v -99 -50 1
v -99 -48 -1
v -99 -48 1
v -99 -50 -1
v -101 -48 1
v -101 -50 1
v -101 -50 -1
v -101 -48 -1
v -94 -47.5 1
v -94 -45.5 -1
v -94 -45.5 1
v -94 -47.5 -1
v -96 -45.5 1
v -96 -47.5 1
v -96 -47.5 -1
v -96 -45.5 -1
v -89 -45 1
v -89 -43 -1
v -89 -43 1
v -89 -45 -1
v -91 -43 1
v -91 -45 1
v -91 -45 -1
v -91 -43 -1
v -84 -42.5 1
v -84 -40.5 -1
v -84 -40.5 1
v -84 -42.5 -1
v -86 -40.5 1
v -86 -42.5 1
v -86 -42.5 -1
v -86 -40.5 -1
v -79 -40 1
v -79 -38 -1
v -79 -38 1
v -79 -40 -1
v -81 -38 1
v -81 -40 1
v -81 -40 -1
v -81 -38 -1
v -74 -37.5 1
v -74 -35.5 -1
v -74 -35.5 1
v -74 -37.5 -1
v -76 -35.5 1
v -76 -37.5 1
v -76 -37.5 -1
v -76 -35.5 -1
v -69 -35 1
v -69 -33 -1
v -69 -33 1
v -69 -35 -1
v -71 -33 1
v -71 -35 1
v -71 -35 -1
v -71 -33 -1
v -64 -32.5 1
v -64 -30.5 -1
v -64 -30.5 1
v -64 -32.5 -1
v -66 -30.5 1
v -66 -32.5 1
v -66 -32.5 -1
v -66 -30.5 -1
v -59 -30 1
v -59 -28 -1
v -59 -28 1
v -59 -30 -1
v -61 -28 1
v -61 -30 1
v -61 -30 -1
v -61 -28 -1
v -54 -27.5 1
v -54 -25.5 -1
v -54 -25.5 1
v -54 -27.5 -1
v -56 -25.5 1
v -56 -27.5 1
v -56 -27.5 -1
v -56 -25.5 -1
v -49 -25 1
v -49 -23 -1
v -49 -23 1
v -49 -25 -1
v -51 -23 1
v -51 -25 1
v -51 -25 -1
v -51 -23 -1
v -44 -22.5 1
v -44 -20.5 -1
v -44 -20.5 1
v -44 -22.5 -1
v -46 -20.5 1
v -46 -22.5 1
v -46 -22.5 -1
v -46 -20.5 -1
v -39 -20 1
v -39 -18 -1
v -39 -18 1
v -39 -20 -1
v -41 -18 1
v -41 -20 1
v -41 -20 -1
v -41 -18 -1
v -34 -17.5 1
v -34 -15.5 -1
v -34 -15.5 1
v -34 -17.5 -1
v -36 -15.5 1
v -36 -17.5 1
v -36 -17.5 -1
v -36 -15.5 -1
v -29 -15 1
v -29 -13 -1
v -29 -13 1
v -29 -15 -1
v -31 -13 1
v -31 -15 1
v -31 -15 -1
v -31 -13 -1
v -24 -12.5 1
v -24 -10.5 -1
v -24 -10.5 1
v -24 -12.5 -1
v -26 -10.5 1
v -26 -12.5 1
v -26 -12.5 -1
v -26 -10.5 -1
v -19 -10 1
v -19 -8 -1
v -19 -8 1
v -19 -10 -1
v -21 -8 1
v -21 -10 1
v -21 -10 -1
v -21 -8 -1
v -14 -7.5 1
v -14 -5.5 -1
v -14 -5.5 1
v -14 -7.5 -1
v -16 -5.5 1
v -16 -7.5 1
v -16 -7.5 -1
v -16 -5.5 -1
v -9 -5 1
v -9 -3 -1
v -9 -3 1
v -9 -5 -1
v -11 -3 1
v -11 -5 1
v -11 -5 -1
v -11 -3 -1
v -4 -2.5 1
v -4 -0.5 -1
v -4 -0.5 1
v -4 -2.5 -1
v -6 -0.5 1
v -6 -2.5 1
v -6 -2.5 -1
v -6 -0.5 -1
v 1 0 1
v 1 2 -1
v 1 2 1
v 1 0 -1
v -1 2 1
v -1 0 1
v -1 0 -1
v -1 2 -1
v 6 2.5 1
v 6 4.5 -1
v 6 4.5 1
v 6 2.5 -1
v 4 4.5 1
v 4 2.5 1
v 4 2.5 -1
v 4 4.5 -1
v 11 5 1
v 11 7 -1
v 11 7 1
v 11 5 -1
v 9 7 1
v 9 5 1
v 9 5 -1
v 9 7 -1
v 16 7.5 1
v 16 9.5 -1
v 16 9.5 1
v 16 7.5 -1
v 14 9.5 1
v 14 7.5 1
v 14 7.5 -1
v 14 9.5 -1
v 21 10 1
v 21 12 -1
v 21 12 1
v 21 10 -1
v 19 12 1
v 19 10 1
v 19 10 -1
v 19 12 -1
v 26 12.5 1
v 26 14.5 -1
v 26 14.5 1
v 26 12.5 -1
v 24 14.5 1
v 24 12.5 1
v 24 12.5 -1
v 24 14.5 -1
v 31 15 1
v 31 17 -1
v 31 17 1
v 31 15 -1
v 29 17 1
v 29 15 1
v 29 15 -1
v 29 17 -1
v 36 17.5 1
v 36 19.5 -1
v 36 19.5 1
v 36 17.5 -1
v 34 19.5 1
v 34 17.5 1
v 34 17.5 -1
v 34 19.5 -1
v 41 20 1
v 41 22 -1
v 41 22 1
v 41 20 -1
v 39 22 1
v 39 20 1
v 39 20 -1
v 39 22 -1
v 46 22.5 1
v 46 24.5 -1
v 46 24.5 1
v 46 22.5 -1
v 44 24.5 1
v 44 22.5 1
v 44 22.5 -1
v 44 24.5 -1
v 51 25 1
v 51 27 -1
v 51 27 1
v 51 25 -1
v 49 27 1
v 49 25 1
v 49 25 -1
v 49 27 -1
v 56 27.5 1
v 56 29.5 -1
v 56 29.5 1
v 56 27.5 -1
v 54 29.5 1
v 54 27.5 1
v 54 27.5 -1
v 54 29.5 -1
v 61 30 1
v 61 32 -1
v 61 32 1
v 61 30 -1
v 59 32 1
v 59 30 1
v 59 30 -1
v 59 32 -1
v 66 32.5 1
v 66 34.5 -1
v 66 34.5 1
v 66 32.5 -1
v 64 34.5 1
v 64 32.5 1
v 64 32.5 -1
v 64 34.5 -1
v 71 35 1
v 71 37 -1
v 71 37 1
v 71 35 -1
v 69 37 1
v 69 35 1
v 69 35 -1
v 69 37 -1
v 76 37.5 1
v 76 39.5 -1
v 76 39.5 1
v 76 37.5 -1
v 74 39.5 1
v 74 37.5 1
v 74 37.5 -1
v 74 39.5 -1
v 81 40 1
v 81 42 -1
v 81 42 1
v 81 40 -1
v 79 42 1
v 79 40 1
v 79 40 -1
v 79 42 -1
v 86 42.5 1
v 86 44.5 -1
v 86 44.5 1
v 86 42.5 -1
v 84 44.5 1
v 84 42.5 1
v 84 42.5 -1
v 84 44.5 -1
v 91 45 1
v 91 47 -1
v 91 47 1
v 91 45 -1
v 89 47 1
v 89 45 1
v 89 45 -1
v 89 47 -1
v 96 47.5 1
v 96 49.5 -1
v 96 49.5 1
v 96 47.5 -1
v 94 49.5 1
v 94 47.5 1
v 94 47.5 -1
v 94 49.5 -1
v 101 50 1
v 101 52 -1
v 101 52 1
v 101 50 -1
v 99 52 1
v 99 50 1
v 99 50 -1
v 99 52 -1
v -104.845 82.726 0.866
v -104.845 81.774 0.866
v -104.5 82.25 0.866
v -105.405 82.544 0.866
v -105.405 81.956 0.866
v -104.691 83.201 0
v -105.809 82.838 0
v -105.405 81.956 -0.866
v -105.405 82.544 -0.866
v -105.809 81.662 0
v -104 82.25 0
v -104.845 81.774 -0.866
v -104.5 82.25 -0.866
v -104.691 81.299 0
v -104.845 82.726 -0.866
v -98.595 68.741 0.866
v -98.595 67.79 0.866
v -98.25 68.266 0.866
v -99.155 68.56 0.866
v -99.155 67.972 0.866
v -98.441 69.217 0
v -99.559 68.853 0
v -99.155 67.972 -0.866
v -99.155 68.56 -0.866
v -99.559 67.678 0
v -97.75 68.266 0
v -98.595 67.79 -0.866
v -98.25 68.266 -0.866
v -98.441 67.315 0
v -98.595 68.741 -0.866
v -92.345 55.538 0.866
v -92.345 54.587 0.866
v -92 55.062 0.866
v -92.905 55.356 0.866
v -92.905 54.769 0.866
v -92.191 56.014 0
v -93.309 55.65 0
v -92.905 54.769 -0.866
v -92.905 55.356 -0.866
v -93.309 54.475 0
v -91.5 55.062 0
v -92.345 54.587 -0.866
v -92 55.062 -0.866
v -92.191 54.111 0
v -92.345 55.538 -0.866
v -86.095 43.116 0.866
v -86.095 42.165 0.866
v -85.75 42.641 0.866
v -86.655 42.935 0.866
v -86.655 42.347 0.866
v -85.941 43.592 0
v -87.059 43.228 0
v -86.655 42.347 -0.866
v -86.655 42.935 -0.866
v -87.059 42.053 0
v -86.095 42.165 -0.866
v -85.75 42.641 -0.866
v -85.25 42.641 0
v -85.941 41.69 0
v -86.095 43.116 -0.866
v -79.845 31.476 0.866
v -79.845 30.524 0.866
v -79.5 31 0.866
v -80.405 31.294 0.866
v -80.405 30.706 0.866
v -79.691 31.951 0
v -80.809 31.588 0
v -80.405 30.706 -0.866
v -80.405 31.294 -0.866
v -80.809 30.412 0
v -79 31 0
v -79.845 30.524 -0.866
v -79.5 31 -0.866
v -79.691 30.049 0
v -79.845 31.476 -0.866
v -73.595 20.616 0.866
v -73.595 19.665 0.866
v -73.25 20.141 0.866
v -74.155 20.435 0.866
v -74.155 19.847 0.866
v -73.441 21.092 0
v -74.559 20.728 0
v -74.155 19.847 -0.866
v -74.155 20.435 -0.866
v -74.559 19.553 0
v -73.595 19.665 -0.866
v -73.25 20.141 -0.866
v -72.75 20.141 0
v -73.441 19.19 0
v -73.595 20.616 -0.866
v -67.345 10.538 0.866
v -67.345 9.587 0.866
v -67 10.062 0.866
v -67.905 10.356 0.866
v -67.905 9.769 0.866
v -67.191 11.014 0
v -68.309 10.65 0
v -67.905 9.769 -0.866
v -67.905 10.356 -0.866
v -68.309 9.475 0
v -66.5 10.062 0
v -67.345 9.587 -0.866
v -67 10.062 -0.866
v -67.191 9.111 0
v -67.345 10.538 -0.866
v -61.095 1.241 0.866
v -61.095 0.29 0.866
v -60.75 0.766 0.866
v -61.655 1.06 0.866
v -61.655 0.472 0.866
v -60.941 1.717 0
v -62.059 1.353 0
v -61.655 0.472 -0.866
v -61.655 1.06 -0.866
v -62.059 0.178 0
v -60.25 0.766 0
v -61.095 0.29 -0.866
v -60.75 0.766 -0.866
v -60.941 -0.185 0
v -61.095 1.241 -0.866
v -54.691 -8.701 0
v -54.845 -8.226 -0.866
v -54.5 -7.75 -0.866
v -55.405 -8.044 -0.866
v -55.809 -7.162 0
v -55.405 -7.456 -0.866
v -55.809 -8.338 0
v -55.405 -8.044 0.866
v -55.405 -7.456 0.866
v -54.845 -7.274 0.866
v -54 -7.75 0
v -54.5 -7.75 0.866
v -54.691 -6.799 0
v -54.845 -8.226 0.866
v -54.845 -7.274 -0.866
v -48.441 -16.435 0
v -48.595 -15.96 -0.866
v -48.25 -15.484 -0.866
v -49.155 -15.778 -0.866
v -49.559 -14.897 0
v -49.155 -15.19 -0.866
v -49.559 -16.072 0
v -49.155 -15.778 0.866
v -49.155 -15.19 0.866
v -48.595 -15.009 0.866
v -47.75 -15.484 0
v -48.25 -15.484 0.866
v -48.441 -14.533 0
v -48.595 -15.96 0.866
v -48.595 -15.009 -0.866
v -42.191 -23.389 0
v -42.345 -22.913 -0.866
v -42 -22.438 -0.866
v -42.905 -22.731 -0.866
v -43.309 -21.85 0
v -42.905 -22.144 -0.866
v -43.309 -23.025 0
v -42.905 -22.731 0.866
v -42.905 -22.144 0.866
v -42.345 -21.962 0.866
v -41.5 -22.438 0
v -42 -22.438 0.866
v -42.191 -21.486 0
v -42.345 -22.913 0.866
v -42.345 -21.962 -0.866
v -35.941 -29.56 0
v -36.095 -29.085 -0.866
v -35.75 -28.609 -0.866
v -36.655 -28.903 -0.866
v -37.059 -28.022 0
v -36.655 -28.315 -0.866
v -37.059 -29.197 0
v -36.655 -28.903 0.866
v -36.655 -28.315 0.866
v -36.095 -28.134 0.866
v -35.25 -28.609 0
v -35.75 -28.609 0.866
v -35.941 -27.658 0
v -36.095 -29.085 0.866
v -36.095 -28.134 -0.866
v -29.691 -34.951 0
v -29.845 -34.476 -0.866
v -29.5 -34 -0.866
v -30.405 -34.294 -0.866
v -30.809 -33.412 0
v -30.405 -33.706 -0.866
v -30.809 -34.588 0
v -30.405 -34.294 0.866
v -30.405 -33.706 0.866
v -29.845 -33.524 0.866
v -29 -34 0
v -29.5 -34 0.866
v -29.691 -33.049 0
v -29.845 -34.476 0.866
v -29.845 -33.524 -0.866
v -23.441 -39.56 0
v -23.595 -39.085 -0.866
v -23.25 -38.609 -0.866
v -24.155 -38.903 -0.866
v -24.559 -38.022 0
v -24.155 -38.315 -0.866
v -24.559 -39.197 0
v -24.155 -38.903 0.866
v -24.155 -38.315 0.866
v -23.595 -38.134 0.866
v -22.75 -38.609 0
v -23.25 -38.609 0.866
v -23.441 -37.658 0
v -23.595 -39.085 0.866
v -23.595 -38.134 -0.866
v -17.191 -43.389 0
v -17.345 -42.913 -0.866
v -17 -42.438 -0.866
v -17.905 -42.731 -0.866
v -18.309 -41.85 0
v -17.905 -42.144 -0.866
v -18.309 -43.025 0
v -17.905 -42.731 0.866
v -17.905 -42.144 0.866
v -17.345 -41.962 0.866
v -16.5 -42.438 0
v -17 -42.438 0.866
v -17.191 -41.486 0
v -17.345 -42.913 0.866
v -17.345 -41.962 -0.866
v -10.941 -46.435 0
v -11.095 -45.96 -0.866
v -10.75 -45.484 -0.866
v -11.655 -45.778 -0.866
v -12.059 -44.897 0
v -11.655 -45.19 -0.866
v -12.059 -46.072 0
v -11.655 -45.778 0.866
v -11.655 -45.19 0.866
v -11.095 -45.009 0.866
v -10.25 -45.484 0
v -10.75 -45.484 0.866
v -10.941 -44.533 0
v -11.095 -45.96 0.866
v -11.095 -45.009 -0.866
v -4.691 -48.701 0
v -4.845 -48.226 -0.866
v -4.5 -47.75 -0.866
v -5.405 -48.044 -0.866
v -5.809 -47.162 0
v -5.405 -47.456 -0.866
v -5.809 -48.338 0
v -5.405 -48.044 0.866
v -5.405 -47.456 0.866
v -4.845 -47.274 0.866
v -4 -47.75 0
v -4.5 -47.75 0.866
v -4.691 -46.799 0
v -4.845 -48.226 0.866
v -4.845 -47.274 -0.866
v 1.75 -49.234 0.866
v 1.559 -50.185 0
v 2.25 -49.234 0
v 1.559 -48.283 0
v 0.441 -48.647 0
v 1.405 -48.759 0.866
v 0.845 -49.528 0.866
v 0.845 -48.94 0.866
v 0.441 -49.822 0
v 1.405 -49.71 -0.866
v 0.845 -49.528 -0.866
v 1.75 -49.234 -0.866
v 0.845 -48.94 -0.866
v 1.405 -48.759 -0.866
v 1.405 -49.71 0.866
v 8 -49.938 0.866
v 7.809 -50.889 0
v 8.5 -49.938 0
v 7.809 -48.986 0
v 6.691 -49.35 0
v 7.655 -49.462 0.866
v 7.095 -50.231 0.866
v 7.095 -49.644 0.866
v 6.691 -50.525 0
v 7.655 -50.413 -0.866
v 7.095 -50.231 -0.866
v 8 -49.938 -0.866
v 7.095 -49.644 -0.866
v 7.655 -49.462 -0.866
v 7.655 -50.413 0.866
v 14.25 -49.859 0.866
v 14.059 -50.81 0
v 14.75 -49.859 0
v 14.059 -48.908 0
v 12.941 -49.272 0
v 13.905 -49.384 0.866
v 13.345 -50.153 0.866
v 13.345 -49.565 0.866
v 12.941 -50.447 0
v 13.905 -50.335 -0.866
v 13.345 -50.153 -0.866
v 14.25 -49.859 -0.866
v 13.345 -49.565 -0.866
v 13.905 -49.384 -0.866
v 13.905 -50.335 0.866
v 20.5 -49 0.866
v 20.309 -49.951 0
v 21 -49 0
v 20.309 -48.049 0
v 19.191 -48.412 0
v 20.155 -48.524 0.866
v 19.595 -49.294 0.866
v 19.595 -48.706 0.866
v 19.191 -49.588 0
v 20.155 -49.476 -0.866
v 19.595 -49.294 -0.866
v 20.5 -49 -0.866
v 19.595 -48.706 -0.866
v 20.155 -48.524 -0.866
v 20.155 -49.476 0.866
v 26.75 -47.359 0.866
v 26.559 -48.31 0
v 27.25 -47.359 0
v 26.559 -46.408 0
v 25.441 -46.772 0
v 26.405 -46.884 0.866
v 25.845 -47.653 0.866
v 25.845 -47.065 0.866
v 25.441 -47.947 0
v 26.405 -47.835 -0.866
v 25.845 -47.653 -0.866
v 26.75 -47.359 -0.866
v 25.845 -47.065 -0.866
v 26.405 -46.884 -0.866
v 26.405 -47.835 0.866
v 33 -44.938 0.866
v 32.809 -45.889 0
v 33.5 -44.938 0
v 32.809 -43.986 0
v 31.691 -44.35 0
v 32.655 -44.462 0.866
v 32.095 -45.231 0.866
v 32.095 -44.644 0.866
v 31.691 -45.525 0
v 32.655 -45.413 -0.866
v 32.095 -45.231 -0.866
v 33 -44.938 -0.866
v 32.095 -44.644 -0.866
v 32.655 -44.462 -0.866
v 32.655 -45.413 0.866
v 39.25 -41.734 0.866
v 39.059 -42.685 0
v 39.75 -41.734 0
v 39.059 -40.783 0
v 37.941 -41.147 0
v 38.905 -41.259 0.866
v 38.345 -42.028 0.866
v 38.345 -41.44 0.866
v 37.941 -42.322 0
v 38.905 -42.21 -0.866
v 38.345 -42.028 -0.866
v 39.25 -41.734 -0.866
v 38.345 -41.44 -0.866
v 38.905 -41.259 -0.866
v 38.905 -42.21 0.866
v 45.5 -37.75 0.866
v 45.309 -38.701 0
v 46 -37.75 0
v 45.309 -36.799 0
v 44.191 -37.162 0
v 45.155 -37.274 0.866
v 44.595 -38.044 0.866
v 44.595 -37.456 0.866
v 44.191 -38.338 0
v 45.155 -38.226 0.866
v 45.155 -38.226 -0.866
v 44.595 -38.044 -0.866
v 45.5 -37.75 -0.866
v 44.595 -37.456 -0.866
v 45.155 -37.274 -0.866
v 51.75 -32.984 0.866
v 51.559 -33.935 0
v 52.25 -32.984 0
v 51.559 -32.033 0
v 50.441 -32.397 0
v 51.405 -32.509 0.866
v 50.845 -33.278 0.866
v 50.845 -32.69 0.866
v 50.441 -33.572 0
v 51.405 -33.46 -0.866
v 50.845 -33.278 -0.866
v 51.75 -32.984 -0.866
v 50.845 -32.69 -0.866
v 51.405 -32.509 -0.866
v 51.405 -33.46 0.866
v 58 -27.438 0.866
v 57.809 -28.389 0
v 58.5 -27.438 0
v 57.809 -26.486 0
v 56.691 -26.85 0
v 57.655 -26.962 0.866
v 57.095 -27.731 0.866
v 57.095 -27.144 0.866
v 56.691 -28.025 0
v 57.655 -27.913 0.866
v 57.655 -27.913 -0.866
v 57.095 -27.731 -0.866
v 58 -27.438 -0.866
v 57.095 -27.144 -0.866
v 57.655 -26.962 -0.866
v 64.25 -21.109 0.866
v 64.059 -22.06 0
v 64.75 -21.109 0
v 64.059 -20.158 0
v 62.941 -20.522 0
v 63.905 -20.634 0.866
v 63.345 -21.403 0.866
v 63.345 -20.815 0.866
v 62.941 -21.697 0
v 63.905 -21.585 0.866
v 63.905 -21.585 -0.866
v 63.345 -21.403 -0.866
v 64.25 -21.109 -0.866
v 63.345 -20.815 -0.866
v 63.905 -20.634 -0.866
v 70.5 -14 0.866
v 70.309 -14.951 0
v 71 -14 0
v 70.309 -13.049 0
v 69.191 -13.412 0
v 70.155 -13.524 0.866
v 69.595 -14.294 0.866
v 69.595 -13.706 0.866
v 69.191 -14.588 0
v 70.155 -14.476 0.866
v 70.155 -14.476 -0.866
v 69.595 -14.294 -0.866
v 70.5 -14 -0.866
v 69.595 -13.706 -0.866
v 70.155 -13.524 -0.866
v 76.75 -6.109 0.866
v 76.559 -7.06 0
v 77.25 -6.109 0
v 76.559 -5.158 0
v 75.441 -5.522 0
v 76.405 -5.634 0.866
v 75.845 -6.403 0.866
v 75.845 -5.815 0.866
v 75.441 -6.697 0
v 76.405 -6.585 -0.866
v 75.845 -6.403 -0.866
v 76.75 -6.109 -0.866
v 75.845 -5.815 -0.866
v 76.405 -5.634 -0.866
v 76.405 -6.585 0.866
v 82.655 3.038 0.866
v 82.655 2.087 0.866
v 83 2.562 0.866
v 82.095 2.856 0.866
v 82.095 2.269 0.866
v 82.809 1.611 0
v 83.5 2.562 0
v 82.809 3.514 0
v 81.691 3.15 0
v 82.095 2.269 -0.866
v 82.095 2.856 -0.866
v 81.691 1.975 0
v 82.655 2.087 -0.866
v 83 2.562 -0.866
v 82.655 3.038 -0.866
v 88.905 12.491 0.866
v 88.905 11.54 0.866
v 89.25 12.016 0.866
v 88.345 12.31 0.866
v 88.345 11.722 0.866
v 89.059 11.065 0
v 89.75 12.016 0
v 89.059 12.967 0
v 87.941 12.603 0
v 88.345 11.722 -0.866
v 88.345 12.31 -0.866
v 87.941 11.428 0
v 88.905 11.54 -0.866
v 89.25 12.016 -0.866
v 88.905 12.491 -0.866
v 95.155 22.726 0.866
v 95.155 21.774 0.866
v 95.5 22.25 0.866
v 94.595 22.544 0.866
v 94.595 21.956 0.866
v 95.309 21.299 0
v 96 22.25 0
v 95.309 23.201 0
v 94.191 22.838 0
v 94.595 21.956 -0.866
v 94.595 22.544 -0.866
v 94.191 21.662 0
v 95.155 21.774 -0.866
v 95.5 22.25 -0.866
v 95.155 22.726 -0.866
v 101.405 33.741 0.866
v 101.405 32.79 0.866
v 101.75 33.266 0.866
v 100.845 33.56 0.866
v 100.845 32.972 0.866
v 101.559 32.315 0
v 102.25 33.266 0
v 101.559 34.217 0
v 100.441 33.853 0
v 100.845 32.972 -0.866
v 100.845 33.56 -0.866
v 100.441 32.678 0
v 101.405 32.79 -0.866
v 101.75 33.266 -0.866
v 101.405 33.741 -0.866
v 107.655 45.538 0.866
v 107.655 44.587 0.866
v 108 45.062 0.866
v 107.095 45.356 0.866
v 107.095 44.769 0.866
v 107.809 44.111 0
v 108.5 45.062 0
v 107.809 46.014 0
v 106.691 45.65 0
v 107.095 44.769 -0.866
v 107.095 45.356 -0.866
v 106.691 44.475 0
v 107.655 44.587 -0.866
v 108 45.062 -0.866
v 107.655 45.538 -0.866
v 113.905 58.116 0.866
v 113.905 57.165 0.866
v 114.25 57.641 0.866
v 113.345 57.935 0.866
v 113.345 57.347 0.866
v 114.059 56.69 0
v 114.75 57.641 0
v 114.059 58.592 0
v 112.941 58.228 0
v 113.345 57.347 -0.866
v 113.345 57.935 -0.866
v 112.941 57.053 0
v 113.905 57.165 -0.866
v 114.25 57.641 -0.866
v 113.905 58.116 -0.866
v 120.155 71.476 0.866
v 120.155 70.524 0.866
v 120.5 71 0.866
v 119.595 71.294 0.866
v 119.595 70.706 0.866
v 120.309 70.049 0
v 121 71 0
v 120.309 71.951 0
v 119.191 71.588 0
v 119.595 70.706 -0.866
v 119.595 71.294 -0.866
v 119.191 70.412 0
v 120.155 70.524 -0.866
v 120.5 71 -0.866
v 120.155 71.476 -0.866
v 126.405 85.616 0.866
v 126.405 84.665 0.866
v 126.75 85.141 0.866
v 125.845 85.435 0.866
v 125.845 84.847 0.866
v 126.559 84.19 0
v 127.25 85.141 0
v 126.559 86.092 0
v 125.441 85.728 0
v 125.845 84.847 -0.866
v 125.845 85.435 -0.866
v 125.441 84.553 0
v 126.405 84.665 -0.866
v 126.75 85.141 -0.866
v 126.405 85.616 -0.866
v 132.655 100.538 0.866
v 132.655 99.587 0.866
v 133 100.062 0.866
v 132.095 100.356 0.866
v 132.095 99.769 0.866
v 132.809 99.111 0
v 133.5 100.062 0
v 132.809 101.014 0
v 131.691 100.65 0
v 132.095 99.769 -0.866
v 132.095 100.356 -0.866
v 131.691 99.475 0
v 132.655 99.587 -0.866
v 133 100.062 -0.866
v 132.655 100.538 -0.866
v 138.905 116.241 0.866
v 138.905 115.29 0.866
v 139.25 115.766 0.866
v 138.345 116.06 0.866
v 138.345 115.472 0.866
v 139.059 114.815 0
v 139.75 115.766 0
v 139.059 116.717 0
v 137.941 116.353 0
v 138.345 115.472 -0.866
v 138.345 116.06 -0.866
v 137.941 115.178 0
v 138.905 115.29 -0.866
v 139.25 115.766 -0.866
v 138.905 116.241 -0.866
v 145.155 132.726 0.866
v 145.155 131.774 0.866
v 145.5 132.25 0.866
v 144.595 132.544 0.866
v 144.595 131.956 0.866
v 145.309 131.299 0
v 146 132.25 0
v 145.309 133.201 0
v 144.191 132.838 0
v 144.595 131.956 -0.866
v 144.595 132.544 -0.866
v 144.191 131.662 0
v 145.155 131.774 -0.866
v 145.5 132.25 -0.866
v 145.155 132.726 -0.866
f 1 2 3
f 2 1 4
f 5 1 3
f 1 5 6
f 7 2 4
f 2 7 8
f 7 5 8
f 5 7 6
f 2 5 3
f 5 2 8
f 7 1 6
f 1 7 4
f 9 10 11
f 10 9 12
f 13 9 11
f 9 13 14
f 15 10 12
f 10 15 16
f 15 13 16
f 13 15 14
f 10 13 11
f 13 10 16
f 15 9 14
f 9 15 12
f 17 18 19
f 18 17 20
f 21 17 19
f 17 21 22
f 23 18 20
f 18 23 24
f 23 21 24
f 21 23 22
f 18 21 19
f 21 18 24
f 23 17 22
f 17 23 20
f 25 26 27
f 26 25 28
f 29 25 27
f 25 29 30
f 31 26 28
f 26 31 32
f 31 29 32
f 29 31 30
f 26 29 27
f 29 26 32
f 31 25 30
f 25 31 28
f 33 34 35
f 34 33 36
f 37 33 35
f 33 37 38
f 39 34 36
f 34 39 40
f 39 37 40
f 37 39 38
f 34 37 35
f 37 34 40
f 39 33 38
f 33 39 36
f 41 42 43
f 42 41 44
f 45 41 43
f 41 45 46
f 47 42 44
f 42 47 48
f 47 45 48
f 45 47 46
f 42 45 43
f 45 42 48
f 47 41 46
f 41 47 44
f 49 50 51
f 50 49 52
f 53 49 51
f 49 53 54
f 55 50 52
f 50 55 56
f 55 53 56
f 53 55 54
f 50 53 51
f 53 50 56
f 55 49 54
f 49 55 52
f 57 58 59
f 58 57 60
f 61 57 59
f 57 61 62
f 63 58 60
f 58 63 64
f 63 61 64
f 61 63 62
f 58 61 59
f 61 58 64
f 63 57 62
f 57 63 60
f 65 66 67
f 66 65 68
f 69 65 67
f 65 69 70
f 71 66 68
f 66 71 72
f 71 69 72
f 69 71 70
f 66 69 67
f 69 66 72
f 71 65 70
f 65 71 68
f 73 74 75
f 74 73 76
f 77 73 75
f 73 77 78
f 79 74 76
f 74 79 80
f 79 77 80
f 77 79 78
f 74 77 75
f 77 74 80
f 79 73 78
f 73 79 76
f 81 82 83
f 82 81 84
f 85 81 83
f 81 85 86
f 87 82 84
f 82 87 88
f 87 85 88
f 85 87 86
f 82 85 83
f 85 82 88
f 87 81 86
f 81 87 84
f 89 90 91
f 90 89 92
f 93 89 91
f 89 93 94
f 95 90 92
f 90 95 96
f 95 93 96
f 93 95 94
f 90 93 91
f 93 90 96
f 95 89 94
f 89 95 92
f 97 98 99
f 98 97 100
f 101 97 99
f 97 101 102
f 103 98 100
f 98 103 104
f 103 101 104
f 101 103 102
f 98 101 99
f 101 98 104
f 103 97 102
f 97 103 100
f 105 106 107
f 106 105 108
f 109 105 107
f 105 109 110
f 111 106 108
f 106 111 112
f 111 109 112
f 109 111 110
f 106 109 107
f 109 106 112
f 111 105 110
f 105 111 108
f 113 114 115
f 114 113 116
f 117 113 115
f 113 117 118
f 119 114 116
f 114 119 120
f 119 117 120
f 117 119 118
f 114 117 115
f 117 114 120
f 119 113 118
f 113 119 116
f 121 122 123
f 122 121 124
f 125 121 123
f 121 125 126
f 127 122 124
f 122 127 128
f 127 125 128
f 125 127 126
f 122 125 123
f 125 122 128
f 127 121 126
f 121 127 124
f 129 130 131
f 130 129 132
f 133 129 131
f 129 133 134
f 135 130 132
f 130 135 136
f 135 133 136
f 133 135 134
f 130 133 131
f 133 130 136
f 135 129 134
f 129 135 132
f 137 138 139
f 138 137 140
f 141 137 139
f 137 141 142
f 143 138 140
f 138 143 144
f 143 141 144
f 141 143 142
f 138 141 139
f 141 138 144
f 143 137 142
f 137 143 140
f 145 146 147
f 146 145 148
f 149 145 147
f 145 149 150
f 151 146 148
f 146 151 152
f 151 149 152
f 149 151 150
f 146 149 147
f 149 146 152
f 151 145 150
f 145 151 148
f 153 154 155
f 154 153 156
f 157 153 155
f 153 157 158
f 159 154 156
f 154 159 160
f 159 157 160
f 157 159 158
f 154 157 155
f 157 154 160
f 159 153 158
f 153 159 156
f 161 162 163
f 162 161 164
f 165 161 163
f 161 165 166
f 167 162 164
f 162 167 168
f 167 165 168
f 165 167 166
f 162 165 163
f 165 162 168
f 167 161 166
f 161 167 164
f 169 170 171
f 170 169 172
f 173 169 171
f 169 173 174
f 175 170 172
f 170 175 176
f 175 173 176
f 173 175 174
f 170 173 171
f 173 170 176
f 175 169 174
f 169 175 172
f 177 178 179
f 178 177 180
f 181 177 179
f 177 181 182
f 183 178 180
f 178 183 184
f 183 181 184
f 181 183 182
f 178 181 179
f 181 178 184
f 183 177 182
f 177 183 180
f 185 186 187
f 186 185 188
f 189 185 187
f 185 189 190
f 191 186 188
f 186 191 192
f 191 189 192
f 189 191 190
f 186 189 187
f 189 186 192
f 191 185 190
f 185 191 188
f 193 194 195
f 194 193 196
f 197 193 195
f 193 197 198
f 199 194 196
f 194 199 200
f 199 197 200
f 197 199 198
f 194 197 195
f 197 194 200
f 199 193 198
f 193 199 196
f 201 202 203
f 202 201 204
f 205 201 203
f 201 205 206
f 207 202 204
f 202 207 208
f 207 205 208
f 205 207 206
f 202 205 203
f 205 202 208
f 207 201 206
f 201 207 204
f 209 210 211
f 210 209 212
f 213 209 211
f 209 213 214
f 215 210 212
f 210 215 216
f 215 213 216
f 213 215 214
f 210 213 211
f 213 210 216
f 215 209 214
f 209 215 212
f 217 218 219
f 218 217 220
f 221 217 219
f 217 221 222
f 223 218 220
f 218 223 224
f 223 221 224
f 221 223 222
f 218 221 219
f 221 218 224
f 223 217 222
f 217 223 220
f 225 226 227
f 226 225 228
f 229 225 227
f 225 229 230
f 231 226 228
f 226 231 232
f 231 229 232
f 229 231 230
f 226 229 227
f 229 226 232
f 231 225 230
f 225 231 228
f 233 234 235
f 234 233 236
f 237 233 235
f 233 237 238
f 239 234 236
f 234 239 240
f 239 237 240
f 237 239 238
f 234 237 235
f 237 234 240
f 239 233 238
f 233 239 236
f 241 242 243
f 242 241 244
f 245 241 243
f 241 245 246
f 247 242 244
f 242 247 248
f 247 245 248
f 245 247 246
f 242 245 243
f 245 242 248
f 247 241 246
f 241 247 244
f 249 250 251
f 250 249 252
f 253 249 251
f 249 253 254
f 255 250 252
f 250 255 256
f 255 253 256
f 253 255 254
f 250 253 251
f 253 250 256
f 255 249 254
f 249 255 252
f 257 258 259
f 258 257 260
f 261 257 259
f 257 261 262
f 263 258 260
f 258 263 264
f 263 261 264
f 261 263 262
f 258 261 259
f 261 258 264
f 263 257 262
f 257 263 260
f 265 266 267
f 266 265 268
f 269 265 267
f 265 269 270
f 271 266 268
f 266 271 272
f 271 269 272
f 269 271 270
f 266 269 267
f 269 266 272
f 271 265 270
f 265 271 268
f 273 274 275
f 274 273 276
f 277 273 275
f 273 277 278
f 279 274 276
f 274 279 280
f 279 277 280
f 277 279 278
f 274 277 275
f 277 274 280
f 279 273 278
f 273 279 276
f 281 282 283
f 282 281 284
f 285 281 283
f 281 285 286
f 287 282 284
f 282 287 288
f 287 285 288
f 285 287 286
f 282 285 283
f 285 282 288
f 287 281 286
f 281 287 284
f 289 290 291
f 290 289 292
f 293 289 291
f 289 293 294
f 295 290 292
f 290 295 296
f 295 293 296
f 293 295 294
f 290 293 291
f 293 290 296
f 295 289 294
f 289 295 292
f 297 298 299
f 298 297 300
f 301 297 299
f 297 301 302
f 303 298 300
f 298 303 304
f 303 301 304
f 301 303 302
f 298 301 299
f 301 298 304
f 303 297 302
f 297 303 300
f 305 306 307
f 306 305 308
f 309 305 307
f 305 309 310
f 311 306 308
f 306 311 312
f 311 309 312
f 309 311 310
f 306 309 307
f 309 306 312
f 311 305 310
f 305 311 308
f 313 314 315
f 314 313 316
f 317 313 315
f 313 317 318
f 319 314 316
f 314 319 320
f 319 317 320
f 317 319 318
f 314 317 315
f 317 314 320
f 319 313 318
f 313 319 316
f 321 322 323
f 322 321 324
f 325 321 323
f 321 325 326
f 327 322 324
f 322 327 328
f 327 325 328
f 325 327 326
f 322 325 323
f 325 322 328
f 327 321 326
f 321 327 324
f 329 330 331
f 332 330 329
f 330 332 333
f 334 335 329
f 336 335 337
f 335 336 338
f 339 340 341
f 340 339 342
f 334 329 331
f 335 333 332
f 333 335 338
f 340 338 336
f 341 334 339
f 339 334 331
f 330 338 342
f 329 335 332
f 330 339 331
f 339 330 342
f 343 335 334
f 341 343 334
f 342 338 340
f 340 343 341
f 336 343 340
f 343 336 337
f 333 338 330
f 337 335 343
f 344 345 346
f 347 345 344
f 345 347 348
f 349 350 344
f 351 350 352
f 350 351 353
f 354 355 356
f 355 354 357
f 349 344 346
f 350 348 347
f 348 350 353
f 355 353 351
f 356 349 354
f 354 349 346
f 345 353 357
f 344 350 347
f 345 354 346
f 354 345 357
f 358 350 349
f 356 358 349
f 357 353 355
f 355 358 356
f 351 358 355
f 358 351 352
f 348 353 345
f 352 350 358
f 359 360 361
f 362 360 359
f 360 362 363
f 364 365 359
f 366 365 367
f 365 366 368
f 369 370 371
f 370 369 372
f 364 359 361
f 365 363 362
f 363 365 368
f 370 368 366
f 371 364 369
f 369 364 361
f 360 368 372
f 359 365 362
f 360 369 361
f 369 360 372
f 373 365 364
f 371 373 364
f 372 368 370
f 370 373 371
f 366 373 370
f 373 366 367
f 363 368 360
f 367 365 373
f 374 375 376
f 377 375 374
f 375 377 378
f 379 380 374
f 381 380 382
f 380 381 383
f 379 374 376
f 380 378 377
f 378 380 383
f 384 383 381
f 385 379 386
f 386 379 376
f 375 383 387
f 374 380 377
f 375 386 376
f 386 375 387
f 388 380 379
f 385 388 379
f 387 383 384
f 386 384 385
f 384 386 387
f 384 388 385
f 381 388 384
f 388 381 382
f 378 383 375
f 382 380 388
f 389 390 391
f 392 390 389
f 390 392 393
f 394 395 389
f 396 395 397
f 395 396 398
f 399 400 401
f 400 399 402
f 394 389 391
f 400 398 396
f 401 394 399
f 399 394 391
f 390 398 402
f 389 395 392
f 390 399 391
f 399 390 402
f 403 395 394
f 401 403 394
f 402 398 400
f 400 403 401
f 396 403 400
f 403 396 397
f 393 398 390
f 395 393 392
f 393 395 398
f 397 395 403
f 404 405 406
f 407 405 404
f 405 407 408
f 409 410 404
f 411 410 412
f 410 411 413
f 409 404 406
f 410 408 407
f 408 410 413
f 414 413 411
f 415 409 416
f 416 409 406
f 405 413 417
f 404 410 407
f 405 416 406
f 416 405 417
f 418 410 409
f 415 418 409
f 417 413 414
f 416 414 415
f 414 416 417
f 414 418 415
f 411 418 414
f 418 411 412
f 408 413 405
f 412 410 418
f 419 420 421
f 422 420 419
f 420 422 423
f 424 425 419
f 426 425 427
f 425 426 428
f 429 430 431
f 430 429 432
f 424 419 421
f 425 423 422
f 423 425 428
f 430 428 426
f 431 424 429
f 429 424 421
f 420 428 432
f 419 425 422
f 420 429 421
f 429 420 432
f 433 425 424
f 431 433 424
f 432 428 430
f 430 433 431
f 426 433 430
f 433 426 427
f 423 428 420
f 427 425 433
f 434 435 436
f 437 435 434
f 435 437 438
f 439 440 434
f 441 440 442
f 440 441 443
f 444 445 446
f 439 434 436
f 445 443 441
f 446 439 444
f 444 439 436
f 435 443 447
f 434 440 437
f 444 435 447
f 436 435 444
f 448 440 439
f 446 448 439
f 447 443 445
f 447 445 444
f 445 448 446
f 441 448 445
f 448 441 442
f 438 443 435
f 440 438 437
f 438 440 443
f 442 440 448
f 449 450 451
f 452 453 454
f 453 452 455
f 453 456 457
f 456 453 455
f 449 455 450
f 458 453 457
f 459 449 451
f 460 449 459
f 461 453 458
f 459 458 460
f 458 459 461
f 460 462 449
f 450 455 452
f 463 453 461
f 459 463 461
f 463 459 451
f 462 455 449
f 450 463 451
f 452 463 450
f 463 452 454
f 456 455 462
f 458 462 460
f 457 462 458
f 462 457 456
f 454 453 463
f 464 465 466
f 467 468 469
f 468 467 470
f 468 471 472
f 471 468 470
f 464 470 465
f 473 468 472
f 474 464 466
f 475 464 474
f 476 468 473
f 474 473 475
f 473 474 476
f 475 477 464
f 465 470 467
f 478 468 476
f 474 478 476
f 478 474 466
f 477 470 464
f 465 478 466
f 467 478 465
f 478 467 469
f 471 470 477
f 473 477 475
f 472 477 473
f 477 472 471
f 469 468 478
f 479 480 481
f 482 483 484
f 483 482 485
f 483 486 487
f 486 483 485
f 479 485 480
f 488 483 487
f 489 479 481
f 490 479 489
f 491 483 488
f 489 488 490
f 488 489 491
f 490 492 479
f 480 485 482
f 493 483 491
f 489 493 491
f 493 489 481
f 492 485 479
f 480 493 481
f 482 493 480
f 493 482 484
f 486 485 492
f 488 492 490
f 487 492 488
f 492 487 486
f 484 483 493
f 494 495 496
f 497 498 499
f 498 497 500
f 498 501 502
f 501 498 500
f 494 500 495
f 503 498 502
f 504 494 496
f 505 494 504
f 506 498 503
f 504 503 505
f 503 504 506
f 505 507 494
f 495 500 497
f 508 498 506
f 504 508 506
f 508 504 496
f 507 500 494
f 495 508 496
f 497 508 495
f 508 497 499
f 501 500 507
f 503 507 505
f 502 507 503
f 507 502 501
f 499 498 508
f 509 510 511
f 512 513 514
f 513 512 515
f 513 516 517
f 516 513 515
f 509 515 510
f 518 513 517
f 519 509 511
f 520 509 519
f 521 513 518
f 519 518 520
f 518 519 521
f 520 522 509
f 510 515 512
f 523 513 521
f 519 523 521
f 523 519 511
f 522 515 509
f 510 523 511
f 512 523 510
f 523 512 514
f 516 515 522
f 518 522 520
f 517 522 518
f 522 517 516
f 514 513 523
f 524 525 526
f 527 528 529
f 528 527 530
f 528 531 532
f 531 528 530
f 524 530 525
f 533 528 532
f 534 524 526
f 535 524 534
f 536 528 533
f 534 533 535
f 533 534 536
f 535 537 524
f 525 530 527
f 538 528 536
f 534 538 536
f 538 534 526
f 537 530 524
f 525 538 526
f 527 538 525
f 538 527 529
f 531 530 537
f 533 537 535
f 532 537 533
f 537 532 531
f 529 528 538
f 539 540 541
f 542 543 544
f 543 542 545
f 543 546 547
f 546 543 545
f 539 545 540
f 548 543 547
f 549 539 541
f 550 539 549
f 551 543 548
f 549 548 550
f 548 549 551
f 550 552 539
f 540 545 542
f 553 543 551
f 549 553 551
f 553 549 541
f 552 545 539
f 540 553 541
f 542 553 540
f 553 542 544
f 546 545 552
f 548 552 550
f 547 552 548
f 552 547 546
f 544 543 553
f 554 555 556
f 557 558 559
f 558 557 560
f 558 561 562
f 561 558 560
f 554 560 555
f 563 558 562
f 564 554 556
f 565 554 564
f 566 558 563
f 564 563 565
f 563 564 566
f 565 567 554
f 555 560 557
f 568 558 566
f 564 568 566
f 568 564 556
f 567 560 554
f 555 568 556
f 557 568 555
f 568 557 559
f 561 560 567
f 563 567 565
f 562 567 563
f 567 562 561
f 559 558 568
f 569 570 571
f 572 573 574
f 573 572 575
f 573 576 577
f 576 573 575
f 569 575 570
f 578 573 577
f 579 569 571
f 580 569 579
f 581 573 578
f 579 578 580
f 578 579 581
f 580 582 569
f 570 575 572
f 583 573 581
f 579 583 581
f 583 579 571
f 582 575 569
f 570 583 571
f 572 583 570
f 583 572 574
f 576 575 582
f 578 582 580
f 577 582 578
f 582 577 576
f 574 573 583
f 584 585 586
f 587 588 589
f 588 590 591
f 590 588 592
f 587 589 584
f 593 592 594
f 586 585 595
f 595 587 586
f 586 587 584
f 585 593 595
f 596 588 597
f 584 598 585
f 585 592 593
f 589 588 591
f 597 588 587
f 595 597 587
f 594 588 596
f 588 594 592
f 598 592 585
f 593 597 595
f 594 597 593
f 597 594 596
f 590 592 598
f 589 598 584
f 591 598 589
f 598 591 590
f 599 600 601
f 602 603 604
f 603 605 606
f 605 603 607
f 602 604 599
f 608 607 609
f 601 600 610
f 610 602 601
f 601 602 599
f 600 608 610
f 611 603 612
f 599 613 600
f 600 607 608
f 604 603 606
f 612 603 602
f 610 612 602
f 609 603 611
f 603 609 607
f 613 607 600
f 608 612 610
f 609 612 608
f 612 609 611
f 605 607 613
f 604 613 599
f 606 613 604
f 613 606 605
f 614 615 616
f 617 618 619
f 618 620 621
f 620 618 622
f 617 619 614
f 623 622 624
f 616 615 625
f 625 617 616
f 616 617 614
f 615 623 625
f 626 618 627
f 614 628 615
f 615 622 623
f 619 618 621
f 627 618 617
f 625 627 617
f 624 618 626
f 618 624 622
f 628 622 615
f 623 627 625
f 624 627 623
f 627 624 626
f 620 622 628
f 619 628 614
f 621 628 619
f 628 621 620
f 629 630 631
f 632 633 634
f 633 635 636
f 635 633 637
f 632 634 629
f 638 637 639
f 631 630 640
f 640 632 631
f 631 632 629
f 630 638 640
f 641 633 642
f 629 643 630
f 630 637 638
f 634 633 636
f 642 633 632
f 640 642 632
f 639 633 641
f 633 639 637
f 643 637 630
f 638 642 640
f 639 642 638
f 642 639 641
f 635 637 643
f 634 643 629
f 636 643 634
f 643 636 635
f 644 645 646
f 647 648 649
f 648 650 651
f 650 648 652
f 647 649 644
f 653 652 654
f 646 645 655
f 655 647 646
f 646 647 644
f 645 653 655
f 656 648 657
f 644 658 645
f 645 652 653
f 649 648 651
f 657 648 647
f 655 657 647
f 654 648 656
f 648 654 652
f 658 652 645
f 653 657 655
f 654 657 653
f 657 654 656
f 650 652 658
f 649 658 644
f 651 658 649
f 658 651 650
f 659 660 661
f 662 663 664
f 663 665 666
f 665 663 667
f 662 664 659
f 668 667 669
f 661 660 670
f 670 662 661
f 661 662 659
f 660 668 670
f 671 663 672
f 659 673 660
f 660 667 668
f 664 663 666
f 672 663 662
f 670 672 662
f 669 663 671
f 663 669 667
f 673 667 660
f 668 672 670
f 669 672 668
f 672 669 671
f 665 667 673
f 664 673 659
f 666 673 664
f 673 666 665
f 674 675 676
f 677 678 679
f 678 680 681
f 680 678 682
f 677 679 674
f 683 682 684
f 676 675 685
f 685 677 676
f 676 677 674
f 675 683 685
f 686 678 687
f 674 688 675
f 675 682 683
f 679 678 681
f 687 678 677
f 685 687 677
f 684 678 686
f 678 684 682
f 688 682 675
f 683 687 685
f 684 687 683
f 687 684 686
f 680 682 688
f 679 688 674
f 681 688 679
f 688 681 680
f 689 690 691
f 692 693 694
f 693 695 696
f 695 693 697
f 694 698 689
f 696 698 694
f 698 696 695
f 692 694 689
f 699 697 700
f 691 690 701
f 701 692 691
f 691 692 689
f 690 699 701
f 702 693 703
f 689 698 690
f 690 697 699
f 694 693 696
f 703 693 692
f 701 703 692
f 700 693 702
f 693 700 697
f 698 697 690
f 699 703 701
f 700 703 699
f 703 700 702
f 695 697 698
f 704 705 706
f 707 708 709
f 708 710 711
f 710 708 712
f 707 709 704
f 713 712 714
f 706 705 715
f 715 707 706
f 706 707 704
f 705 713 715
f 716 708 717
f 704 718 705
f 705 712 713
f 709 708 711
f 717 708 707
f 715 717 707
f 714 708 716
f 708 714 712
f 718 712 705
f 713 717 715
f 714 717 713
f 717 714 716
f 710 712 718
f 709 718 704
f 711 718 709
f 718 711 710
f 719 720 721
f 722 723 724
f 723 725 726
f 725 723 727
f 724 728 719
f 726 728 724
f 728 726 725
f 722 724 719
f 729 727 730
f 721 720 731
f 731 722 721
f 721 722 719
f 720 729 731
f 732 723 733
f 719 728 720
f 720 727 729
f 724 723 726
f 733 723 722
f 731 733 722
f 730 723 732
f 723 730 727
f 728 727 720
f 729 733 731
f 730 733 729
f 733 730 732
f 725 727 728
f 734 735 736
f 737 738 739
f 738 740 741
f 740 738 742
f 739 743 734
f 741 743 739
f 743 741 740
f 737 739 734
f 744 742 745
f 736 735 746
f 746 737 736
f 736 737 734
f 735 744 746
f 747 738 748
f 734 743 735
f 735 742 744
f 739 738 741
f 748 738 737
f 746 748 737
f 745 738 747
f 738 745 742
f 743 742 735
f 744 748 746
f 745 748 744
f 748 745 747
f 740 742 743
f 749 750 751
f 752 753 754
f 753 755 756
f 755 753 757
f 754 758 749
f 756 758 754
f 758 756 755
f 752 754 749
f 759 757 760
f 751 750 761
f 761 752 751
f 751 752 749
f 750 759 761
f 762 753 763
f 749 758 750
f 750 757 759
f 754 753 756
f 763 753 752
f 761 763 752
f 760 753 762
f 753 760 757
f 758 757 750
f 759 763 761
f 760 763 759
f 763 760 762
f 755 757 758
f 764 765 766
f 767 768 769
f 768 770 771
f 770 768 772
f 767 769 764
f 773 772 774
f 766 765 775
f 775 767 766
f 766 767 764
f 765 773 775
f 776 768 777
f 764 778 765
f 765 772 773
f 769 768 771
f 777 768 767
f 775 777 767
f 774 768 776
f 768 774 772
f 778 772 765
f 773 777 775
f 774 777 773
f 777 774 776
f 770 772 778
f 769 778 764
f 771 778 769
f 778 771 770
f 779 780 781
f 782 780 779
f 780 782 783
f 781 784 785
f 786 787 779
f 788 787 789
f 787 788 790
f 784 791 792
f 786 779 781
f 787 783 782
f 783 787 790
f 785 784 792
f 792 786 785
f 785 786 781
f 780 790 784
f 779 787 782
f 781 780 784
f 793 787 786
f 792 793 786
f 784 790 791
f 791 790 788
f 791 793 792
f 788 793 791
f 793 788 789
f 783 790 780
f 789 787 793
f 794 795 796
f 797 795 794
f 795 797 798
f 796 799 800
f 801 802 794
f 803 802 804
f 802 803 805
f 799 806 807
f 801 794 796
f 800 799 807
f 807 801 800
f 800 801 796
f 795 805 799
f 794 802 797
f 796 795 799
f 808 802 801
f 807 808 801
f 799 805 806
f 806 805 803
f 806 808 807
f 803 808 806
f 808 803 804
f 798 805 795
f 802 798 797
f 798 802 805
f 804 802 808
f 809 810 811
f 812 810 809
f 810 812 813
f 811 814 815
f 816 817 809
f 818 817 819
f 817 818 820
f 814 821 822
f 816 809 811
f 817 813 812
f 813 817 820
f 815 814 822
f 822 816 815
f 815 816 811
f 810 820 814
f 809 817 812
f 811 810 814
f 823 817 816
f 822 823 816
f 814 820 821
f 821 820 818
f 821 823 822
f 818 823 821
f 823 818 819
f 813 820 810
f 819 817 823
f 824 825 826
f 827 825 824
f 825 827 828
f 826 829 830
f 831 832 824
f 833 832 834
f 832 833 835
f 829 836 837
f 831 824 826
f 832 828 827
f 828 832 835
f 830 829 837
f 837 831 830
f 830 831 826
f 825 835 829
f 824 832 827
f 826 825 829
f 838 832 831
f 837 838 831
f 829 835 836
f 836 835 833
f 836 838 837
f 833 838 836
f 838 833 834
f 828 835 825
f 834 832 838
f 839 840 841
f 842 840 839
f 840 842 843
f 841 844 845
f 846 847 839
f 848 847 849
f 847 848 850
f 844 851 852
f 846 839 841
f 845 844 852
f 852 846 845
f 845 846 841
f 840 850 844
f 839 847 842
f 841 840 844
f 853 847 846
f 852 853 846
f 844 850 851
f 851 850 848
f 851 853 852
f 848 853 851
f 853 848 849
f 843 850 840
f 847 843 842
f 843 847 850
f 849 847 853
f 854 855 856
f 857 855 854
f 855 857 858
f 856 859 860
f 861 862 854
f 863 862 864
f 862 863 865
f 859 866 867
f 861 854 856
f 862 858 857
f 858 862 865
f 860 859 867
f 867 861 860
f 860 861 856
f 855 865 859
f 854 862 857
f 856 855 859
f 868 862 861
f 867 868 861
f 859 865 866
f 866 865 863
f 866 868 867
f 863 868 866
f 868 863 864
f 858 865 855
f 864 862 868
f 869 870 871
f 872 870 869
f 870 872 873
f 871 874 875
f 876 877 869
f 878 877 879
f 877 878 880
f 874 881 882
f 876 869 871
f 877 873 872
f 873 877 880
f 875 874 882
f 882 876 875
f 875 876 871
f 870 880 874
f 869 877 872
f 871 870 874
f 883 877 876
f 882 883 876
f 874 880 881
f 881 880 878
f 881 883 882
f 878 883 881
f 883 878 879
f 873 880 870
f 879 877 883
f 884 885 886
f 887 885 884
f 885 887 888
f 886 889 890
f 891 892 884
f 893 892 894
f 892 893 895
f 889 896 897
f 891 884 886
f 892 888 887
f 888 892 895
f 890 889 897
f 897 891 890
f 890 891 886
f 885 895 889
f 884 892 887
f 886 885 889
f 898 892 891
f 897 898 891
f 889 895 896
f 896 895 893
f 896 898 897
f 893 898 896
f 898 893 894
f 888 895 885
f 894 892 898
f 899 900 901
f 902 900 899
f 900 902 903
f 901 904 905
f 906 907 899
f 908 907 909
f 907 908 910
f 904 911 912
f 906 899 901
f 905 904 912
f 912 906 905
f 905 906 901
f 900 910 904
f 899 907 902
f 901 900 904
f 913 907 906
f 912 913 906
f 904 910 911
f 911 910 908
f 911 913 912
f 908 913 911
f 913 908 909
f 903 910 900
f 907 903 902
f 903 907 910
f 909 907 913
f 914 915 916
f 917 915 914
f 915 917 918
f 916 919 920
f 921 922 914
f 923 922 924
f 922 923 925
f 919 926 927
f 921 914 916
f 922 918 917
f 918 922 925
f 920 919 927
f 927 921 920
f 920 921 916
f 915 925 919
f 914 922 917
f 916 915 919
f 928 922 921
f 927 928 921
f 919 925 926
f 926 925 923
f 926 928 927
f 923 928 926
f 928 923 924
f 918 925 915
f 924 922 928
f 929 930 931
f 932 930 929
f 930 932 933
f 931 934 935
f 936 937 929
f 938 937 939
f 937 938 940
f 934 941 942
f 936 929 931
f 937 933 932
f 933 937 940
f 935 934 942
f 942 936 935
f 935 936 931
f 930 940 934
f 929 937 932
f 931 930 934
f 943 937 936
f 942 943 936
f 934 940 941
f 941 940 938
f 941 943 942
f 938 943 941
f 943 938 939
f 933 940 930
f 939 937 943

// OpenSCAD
// Volume: 426.4933912564248, SurfaceArea: 1378.2653344929363
echo(version=version());

// Functions can be defined to simplify code using lots of
// calculations.

// Simple example with a single function argument (which should
// be a number) and returning a number calculated based on that.
function f(x) = 0.5 * x + 1;

color("red")
    for (a = [ -100 : 5 : 100 ])
        translate([a, f(a), 0]) cube(2, center = true);

// Functions can call other functions and return complex values
// too. In this case a 3 element vector is returned which can
// be used as point in 3D space or as vector (in the mathematical
// meaning) for translations and other transformations.
function g(x) = [ 5 * x + 20, f(x) * f(x) - 50, 0 ];

color("green")
    for (a = [ -200 : 10 : 200 ])
        translate(g(a / 8)) sphere(1);



// Written in 2015 by Torsten Paul <Torsten.Paul@gmx.de>
//
// To the extent possible under law, the author(s) have dedicated all
// copyright and related and neighboring rights to this software to the
// public domain worldwide. This software is distributed without any
// warranty.
//
// You should have received a copy of the CC0 Public Domain
// Dedication along with this software.
// If not, see <http://creativecommons.org/publicdomain/zero/1.0/>.
